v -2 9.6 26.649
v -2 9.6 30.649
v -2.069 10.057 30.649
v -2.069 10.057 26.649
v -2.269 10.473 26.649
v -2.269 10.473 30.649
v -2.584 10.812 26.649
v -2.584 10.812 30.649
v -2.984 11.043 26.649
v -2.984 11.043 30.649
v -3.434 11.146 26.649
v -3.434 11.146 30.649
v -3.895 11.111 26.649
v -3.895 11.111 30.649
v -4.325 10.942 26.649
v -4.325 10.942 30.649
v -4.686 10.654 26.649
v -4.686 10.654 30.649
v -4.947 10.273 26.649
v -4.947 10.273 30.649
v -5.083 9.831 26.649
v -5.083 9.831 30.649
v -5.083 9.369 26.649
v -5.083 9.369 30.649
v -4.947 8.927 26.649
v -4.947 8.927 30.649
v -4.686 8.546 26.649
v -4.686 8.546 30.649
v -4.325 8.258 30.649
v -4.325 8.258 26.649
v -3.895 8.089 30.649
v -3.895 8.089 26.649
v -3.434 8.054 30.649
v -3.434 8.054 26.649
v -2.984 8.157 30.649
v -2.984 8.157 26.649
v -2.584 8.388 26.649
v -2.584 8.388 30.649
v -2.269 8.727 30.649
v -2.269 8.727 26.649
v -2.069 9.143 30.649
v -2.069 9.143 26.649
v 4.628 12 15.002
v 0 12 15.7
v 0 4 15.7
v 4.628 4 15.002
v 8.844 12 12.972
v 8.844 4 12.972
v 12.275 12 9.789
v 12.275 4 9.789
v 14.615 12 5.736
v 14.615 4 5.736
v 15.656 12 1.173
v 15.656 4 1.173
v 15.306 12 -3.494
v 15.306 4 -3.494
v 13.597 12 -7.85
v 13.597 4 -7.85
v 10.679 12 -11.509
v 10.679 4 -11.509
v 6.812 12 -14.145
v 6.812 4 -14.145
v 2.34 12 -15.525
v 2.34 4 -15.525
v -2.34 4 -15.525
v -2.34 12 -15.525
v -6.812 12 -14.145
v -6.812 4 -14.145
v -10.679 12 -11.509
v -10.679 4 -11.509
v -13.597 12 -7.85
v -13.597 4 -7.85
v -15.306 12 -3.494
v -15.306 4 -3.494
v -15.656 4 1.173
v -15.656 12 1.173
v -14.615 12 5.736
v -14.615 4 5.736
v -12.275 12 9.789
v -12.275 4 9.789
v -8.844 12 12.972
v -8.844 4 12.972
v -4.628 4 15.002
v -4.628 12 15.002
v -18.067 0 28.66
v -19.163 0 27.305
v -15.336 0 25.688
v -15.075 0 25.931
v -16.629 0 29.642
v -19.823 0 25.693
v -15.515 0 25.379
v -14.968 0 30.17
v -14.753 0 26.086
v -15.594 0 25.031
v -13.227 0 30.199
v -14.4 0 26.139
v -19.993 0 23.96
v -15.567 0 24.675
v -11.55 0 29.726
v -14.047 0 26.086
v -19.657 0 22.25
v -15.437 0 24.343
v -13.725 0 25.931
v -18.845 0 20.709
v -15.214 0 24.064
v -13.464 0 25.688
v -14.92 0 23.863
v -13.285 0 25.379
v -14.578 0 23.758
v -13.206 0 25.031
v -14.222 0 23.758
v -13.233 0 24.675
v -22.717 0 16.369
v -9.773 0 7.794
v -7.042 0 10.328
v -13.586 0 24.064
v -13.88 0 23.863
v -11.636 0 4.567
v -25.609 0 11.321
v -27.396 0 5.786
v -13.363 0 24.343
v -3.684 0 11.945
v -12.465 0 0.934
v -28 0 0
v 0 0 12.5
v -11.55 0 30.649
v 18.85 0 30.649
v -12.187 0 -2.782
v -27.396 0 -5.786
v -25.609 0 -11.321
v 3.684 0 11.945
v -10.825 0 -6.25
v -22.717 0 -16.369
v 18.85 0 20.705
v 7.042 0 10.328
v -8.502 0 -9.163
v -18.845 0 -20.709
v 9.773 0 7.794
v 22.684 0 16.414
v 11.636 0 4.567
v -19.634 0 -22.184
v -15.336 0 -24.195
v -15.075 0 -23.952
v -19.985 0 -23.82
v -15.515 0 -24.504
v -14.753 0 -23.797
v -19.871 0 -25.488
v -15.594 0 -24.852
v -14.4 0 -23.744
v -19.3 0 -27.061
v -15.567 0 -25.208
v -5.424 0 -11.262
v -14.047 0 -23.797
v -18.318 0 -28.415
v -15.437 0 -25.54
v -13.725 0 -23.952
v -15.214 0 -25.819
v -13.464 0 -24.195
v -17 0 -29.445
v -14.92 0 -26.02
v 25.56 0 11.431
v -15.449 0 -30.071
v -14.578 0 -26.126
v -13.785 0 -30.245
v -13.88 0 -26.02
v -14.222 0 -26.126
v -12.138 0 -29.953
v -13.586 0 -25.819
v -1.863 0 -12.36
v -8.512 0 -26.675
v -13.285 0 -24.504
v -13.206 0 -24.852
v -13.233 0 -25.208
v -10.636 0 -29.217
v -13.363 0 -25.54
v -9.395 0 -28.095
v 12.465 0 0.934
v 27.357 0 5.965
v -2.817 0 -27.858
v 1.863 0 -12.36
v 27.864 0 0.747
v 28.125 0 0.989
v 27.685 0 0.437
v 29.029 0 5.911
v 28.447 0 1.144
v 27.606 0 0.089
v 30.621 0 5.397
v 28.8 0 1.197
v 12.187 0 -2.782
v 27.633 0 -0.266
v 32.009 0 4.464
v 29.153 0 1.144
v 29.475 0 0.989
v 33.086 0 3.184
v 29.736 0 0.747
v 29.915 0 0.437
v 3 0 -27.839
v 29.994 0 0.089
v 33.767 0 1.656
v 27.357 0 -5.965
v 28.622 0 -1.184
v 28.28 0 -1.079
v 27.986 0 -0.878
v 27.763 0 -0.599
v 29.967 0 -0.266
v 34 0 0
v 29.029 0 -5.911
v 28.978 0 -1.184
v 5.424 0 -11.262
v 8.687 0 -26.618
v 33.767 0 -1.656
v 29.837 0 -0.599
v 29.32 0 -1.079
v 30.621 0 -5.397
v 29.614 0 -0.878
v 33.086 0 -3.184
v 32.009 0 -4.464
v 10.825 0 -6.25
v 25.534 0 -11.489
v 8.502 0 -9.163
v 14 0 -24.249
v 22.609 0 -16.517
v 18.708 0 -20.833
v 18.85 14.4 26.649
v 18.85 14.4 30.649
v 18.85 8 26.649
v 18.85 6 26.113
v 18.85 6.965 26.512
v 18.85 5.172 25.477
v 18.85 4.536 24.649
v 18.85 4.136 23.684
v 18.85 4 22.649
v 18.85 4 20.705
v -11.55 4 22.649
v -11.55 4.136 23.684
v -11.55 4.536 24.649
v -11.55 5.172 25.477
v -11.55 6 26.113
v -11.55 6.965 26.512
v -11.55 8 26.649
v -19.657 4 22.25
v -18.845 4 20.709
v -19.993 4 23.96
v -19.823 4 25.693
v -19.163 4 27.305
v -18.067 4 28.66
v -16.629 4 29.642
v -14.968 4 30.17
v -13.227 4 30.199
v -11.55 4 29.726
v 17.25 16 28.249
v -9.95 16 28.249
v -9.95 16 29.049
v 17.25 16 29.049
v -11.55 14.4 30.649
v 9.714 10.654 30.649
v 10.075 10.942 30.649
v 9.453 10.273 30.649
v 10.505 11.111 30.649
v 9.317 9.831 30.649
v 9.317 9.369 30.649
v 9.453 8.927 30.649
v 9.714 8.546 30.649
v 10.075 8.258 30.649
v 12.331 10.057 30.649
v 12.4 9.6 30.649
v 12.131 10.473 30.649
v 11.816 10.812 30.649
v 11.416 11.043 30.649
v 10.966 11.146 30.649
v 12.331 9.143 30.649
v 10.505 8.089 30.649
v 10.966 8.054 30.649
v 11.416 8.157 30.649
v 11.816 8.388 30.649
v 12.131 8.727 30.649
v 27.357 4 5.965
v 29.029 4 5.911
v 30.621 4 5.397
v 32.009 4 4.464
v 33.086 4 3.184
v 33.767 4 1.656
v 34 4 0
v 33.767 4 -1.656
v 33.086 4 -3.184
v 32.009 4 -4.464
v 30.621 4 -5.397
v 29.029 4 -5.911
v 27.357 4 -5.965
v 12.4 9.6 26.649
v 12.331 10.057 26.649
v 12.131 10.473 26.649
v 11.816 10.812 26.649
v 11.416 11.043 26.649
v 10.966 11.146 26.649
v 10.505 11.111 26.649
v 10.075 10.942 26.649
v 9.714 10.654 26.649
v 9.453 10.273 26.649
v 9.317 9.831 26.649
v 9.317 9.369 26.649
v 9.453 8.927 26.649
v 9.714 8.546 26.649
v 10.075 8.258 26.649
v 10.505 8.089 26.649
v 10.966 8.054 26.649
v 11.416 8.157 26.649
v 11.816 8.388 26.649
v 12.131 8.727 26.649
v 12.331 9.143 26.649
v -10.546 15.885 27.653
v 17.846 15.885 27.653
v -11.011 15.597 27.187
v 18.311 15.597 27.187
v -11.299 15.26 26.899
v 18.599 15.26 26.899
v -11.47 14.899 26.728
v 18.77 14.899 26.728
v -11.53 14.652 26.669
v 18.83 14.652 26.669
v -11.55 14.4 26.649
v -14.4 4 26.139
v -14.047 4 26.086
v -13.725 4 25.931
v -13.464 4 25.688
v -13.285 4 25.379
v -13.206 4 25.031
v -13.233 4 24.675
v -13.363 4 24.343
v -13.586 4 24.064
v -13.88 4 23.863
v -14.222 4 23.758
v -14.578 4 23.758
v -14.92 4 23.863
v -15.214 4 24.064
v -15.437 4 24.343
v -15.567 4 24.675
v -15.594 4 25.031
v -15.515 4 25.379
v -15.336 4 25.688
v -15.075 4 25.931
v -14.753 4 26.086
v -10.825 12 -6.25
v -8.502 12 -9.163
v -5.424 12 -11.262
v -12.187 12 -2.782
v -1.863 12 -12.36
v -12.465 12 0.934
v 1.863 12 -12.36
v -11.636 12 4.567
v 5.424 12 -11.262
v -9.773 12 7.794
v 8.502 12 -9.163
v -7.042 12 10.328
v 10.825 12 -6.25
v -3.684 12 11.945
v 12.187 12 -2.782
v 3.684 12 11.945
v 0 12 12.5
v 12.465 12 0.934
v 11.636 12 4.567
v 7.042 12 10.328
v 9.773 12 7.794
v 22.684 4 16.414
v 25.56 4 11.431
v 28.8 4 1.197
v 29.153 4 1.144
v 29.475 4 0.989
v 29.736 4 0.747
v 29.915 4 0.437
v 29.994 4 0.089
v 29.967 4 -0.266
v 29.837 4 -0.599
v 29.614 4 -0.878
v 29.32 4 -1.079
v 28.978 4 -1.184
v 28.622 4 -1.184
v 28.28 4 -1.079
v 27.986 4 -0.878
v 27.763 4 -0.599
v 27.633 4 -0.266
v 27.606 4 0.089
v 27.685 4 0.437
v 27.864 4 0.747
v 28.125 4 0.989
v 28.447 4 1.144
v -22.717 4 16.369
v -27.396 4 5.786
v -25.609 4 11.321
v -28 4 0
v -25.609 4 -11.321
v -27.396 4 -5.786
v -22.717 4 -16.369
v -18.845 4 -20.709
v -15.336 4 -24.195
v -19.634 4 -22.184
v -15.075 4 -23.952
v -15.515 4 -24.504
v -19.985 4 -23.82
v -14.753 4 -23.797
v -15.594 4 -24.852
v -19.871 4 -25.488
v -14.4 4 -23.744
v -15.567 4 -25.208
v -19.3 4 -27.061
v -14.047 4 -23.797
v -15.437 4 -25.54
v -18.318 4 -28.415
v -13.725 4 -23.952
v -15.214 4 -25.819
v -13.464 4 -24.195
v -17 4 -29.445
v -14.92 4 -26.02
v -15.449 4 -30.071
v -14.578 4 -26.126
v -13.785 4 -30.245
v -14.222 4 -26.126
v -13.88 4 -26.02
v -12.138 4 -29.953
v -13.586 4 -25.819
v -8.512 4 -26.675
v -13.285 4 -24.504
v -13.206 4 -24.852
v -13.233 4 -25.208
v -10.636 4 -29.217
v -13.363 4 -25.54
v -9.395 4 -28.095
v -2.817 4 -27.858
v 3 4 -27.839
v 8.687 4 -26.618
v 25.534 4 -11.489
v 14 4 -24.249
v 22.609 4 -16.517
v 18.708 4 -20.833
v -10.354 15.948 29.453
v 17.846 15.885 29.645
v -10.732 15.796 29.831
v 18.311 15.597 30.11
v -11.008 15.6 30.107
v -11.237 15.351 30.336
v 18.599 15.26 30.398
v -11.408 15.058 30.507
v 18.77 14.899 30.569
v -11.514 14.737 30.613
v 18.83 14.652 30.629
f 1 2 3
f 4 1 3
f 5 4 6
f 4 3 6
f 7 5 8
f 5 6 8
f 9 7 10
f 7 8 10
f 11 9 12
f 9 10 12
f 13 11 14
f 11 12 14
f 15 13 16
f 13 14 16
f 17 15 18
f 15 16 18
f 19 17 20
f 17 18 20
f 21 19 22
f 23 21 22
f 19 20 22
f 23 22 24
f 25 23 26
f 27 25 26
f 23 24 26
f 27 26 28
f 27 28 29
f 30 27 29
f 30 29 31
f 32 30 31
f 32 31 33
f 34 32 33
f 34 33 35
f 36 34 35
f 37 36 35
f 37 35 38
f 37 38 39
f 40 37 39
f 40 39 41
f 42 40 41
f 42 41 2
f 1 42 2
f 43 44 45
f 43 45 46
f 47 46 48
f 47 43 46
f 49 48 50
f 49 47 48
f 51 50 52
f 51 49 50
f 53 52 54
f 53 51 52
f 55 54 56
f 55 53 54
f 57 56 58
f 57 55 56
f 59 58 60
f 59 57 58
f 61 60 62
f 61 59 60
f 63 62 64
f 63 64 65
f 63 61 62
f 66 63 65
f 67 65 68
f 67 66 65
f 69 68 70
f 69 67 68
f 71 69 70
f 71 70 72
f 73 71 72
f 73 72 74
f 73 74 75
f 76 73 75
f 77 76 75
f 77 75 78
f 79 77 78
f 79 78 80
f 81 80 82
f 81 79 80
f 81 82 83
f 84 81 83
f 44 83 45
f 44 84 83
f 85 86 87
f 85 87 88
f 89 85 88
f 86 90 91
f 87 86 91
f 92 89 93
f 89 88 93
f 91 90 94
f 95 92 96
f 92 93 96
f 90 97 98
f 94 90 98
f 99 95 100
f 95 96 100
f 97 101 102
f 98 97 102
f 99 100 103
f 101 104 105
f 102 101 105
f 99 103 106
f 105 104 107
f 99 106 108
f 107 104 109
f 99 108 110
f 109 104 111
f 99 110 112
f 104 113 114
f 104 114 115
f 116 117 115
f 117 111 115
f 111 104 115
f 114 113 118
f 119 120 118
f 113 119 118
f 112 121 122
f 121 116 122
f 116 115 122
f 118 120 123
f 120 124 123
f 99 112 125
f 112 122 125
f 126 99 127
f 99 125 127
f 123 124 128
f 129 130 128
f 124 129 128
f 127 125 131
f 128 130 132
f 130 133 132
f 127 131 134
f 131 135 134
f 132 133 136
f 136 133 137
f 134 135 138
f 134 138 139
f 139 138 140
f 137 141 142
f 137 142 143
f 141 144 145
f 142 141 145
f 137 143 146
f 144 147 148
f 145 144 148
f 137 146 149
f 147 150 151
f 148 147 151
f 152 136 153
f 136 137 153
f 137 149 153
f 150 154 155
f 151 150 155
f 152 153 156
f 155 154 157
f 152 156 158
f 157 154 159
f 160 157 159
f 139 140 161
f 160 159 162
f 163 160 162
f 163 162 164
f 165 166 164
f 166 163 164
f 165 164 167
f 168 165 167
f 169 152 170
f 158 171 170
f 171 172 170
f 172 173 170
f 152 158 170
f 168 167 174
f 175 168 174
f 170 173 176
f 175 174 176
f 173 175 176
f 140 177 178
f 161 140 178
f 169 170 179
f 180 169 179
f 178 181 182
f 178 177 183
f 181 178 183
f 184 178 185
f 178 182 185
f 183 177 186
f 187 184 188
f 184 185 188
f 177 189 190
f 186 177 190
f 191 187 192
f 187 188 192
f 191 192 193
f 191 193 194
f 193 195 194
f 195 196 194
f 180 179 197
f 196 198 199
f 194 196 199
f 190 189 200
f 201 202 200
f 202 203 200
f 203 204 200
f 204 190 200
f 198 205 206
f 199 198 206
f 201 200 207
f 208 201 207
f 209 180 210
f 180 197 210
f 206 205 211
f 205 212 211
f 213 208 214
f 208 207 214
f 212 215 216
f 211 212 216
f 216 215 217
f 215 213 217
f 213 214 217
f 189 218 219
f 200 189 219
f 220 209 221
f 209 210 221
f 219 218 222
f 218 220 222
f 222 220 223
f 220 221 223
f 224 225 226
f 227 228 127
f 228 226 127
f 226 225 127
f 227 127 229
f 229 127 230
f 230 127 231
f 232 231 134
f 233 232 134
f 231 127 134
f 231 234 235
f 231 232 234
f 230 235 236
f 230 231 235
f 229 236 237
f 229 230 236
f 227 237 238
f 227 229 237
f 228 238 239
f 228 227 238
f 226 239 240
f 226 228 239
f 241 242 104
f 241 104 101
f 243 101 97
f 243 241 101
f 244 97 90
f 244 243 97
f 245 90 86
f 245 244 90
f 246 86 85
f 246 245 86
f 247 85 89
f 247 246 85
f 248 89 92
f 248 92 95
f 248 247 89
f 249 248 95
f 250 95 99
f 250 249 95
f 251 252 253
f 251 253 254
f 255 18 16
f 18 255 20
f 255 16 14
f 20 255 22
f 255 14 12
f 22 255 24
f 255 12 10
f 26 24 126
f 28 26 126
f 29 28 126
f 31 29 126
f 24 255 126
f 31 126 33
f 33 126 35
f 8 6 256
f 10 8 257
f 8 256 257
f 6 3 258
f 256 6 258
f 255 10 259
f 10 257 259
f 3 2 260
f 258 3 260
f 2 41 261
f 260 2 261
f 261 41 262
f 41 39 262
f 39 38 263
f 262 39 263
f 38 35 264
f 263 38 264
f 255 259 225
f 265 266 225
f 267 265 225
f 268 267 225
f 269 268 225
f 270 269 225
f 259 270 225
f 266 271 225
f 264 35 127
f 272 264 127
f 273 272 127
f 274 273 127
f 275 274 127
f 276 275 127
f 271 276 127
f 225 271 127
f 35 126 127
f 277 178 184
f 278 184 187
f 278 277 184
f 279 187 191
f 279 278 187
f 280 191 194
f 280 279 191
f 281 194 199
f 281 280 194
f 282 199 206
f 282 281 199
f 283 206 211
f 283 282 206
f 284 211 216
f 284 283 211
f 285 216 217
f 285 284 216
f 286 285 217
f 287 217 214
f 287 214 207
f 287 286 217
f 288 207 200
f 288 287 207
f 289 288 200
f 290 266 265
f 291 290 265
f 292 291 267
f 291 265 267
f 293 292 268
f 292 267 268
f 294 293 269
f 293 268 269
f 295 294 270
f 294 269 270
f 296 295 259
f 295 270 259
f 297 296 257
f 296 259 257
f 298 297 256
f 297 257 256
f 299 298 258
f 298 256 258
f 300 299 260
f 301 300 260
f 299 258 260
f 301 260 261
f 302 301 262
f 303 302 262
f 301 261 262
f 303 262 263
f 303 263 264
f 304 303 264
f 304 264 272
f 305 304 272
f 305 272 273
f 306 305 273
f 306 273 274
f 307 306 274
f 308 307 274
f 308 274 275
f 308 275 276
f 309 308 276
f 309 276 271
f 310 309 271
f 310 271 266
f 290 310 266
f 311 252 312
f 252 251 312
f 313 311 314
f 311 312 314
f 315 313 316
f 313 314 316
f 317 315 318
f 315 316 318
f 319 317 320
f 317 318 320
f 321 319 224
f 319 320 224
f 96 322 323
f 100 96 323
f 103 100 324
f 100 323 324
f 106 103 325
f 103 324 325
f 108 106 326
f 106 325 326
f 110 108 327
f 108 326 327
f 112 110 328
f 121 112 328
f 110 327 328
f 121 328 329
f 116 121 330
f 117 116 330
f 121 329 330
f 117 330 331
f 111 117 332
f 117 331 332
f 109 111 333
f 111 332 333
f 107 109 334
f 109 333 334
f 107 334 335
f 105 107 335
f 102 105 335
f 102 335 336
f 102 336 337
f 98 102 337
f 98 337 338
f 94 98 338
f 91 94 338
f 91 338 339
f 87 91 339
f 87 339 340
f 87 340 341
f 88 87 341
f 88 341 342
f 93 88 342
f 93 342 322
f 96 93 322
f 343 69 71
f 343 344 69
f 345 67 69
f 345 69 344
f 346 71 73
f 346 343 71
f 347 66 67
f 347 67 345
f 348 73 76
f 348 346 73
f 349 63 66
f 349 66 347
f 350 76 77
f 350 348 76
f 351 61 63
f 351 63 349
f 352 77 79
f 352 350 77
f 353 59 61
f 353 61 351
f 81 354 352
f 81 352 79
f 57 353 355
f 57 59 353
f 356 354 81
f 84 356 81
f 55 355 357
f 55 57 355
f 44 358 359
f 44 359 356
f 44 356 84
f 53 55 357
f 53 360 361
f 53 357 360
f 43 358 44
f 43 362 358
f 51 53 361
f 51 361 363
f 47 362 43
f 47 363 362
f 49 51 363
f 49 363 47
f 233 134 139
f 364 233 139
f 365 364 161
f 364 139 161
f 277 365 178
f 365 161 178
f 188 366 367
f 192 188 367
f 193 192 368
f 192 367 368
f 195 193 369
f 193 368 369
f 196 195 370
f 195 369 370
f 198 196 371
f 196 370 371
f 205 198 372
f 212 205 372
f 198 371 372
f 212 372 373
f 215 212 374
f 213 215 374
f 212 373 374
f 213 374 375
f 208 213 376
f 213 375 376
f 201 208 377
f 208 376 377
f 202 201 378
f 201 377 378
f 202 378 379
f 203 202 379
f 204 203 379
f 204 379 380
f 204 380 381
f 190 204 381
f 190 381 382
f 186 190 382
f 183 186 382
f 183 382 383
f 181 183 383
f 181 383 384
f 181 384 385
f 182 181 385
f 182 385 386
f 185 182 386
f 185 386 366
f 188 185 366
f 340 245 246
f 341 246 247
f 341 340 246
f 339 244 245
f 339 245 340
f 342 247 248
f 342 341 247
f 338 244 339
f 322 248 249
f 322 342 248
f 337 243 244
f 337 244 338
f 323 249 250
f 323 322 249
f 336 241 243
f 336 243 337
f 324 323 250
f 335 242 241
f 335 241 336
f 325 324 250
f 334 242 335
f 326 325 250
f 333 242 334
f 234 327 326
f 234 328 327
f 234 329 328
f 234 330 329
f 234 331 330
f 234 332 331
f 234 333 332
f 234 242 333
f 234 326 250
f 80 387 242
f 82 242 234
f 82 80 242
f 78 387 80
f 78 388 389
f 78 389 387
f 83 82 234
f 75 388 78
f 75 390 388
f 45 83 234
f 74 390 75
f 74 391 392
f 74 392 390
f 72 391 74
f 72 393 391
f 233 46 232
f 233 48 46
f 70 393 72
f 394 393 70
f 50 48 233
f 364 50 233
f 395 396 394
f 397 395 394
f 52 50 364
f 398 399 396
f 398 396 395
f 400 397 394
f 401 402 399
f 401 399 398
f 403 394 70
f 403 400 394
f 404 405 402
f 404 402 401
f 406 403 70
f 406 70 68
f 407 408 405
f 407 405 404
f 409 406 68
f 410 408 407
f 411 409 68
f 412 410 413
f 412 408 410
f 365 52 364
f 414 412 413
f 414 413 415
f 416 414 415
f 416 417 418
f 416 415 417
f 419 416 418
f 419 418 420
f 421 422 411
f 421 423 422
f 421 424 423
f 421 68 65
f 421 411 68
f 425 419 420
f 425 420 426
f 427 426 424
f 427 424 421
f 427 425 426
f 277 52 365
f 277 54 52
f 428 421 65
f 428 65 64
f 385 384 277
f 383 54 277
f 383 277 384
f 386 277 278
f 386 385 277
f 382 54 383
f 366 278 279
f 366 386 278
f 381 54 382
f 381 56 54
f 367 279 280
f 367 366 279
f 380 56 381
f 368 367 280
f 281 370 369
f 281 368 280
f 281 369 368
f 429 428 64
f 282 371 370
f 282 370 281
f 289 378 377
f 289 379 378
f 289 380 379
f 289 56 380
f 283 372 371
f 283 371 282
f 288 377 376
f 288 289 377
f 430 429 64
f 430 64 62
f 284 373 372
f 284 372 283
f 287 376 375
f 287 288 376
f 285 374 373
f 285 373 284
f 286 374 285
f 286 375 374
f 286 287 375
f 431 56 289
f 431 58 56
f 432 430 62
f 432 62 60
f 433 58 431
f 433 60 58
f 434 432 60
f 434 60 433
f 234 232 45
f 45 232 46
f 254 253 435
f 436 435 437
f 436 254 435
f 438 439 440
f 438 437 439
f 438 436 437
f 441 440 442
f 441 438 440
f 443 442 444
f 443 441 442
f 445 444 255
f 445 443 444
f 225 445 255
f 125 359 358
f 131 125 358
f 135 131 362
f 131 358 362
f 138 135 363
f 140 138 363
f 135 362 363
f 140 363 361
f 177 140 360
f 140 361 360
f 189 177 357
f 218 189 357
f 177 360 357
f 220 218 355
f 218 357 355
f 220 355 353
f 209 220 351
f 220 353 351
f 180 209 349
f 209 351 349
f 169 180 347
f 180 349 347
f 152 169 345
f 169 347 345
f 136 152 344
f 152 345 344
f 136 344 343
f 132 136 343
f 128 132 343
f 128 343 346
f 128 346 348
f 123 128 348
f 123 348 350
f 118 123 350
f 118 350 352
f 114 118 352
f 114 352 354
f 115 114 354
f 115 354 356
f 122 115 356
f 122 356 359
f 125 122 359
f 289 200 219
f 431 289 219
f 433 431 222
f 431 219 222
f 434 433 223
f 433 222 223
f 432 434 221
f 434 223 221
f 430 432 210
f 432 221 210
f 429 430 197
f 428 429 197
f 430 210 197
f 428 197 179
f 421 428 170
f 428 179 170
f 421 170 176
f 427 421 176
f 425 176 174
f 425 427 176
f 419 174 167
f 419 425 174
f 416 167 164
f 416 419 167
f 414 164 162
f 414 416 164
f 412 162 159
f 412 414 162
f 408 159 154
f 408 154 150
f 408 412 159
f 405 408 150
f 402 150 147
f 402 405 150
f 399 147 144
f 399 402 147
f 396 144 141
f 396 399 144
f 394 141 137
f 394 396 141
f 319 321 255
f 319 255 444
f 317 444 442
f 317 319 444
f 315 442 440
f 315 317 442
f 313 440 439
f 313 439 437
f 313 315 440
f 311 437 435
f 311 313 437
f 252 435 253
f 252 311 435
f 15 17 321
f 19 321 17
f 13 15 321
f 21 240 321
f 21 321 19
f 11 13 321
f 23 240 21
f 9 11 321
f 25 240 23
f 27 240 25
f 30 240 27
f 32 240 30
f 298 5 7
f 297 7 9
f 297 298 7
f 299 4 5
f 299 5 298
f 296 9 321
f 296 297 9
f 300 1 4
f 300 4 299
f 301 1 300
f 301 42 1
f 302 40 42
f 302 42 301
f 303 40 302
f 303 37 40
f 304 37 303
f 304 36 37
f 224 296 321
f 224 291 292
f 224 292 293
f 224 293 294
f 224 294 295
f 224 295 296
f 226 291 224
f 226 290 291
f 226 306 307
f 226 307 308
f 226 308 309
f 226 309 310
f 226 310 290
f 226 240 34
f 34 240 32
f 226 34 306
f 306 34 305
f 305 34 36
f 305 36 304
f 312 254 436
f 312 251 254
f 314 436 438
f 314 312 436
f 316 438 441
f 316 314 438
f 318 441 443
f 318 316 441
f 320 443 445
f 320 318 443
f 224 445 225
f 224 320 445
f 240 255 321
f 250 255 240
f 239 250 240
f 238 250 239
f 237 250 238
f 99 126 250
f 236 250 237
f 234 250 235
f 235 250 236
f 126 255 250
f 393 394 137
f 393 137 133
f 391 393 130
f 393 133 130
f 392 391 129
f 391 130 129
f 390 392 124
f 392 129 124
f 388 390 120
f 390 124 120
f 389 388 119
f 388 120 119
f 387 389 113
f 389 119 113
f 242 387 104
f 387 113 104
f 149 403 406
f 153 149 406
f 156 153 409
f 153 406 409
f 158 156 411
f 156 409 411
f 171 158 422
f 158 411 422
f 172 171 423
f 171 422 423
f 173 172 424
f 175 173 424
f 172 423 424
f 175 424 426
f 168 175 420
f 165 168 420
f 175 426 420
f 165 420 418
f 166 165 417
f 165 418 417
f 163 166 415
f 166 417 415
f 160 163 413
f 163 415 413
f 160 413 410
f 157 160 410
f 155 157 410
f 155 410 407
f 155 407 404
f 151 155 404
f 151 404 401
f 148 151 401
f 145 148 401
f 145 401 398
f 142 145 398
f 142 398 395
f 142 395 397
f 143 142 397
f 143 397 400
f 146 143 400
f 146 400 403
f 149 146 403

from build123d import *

# Parameters (mm, degrees)
SKETCH1_R           = 28
BOSS_EXTRUDE1_DEPTH = 4
SKETCH2_R           = 6
BOSS_EXTRUDE2_DEPTH = 4
SKETCH4_R           = 1.197375231
CUT_EXTRUDE2_DEPTH  = 46.683525867
SKETCH5_R           = 12.5
CUT_EXTRUDE3_DEPTH  = 46.683525867
BOSS_EXTRUDE3_START = 8
SKETCH6_R           = 15.7
SKETCH6_R_2         = 12.5
BOSS_EXTRUDE3_DEPTH = 8
SKETCH7_W           = 30.4
SKETCH7_H           = 10.4
BOSS_EXTRUDE4_DEPTH = 4
SKETCH8_W           = 30.4
SKETCH8_H           = 4
BOSS_EXTRUDE5_DEPTH = 12
FILLET1_R           = 4
FILLET2_R           = 1.6
SKETCH9_R           = 1.55
CUT_EXTRUDE4_DEPTH  = 5


with BuildPart() as part:
    # Sketch1 → Boss-Extrude1 (new body)
    with BuildSketch(Plane(origin=(0, 0, 0), x_dir=(1, 0, 0), z_dir=(0, 1, 0))):
        with Locations(Location((0, 0, 0), (0, 0, 270))):
            Circle(SKETCH1_R)
    extrude(amount=BOSS_EXTRUDE1_DEPTH)

    # Sketch2 → Boss-Extrude2 (add)
    with BuildSketch(Plane(origin=(0, 4, 0), x_dir=(1, 0, 0), z_dir=(0, 1, 0))):
        with Locations((28, 0)):
            Circle(SKETCH2_R)
        with Locations((-14, -24.248711306)):
            Circle(SKETCH2_R)
        with Locations((-14, 24.248711306)):
            Circle(SKETCH2_R)
    extrude(amount=-BOSS_EXTRUDE2_DEPTH)

    # Sketch4 → Cut-Extrude2 (cut, through all)
    with BuildSketch(Plane(origin=(0, 4, 0), x_dir=(1, 0, 0), z_dir=(0, 1, 0))):
        with Locations(Location((28.8, 0, 0), (0, 0, 270))):
            Circle(SKETCH4_R)
        with Locations(Location((-14.4, -24.941531629, 0), (0, 0, 270))):
            Circle(SKETCH4_R)
        with Locations(Location((-14.4, 24.941531629, 0), (0, 0, 270))):
            Circle(SKETCH4_R)
    extrude(amount=-CUT_EXTRUDE2_DEPTH, mode=Mode.SUBTRACT)

    # Sketch5 → Cut-Extrude3 (cut, through all)
    with BuildSketch(Plane(origin=(0, 4, 0), x_dir=(1, 0, 0), z_dir=(0, 1, 0))):
        with Locations(Location((0, 0, 0), (0, 0, 270))):
            Circle(SKETCH5_R)
    extrude(amount=-CUT_EXTRUDE3_DEPTH, mode=Mode.SUBTRACT)

    # Sketch6 → Boss-Extrude3 (add)
    with BuildSketch(Plane(origin=(0, 4, 0), x_dir=(1, 0, 0), z_dir=(0, 1, 0)).offset(BOSS_EXTRUDE3_START)):
        with Locations(Location((0, 0, 0), (0, 0, 270))):
            Circle(SKETCH6_R)
        with Locations(Location((0, 0, 0), (0, 0, 270))):
            Circle(SKETCH6_R_2, mode=Mode.SUBTRACT)
    extrude(amount=-BOSS_EXTRUDE3_DEPTH)

    # Sketch7 → Boss-Extrude4 (add)
    with BuildSketch(Plane(origin=(0, 4, 0), x_dir=(1, 0, 0), z_dir=(0, 1, 0))):
        with Locations((3.65, -25.448711306)):
            Rectangle(SKETCH7_W, SKETCH7_H)
    extrude(amount=-BOSS_EXTRUDE4_DEPTH)

    # Sketch8 → Boss-Extrude5 (add)
    with BuildSketch(Plane(origin=(0, 4, 0), x_dir=(1, 0, 0), z_dir=(0, 1, 0))):
        with Locations((3.65, -28.648711306)):
            Rectangle(SKETCH8_W, SKETCH8_H)
    extrude(amount=BOSS_EXTRUDE5_DEPTH)

    # Fillet1
    fillet1_edges = [part.edges().sort_by_distance(p)[0] for p in [
        (3.65, 4, 26.648711306),
    ]]
    fillet(fillet1_edges, radius=FILLET1_R)

    # Fillet2
    fillet2_edges = [part.edges().sort_by_distance(p)[0] for p in [
        (18.85, 16, 28.648711306),
        (3.65, 16, 26.648711306),
        (-11.55, 16, 28.648711306),
        (3.65, 16, 30.648711306),
    ]]
    fillet(fillet2_edges, radius=FILLET2_R)

    # Sketch9 → Cut-Extrude4 (cut)
    with BuildSketch(Plane.XY.offset(30.648711306)):
        with Locations((-3.55, 9.6)):
            Circle(SKETCH9_R)
        with Locations((10.85, 9.6)):
            Circle(SKETCH9_R)
    extrude(amount=-CUT_EXTRUDE4_DEPTH, mode=Mode.SUBTRACT)


solid = part.part
